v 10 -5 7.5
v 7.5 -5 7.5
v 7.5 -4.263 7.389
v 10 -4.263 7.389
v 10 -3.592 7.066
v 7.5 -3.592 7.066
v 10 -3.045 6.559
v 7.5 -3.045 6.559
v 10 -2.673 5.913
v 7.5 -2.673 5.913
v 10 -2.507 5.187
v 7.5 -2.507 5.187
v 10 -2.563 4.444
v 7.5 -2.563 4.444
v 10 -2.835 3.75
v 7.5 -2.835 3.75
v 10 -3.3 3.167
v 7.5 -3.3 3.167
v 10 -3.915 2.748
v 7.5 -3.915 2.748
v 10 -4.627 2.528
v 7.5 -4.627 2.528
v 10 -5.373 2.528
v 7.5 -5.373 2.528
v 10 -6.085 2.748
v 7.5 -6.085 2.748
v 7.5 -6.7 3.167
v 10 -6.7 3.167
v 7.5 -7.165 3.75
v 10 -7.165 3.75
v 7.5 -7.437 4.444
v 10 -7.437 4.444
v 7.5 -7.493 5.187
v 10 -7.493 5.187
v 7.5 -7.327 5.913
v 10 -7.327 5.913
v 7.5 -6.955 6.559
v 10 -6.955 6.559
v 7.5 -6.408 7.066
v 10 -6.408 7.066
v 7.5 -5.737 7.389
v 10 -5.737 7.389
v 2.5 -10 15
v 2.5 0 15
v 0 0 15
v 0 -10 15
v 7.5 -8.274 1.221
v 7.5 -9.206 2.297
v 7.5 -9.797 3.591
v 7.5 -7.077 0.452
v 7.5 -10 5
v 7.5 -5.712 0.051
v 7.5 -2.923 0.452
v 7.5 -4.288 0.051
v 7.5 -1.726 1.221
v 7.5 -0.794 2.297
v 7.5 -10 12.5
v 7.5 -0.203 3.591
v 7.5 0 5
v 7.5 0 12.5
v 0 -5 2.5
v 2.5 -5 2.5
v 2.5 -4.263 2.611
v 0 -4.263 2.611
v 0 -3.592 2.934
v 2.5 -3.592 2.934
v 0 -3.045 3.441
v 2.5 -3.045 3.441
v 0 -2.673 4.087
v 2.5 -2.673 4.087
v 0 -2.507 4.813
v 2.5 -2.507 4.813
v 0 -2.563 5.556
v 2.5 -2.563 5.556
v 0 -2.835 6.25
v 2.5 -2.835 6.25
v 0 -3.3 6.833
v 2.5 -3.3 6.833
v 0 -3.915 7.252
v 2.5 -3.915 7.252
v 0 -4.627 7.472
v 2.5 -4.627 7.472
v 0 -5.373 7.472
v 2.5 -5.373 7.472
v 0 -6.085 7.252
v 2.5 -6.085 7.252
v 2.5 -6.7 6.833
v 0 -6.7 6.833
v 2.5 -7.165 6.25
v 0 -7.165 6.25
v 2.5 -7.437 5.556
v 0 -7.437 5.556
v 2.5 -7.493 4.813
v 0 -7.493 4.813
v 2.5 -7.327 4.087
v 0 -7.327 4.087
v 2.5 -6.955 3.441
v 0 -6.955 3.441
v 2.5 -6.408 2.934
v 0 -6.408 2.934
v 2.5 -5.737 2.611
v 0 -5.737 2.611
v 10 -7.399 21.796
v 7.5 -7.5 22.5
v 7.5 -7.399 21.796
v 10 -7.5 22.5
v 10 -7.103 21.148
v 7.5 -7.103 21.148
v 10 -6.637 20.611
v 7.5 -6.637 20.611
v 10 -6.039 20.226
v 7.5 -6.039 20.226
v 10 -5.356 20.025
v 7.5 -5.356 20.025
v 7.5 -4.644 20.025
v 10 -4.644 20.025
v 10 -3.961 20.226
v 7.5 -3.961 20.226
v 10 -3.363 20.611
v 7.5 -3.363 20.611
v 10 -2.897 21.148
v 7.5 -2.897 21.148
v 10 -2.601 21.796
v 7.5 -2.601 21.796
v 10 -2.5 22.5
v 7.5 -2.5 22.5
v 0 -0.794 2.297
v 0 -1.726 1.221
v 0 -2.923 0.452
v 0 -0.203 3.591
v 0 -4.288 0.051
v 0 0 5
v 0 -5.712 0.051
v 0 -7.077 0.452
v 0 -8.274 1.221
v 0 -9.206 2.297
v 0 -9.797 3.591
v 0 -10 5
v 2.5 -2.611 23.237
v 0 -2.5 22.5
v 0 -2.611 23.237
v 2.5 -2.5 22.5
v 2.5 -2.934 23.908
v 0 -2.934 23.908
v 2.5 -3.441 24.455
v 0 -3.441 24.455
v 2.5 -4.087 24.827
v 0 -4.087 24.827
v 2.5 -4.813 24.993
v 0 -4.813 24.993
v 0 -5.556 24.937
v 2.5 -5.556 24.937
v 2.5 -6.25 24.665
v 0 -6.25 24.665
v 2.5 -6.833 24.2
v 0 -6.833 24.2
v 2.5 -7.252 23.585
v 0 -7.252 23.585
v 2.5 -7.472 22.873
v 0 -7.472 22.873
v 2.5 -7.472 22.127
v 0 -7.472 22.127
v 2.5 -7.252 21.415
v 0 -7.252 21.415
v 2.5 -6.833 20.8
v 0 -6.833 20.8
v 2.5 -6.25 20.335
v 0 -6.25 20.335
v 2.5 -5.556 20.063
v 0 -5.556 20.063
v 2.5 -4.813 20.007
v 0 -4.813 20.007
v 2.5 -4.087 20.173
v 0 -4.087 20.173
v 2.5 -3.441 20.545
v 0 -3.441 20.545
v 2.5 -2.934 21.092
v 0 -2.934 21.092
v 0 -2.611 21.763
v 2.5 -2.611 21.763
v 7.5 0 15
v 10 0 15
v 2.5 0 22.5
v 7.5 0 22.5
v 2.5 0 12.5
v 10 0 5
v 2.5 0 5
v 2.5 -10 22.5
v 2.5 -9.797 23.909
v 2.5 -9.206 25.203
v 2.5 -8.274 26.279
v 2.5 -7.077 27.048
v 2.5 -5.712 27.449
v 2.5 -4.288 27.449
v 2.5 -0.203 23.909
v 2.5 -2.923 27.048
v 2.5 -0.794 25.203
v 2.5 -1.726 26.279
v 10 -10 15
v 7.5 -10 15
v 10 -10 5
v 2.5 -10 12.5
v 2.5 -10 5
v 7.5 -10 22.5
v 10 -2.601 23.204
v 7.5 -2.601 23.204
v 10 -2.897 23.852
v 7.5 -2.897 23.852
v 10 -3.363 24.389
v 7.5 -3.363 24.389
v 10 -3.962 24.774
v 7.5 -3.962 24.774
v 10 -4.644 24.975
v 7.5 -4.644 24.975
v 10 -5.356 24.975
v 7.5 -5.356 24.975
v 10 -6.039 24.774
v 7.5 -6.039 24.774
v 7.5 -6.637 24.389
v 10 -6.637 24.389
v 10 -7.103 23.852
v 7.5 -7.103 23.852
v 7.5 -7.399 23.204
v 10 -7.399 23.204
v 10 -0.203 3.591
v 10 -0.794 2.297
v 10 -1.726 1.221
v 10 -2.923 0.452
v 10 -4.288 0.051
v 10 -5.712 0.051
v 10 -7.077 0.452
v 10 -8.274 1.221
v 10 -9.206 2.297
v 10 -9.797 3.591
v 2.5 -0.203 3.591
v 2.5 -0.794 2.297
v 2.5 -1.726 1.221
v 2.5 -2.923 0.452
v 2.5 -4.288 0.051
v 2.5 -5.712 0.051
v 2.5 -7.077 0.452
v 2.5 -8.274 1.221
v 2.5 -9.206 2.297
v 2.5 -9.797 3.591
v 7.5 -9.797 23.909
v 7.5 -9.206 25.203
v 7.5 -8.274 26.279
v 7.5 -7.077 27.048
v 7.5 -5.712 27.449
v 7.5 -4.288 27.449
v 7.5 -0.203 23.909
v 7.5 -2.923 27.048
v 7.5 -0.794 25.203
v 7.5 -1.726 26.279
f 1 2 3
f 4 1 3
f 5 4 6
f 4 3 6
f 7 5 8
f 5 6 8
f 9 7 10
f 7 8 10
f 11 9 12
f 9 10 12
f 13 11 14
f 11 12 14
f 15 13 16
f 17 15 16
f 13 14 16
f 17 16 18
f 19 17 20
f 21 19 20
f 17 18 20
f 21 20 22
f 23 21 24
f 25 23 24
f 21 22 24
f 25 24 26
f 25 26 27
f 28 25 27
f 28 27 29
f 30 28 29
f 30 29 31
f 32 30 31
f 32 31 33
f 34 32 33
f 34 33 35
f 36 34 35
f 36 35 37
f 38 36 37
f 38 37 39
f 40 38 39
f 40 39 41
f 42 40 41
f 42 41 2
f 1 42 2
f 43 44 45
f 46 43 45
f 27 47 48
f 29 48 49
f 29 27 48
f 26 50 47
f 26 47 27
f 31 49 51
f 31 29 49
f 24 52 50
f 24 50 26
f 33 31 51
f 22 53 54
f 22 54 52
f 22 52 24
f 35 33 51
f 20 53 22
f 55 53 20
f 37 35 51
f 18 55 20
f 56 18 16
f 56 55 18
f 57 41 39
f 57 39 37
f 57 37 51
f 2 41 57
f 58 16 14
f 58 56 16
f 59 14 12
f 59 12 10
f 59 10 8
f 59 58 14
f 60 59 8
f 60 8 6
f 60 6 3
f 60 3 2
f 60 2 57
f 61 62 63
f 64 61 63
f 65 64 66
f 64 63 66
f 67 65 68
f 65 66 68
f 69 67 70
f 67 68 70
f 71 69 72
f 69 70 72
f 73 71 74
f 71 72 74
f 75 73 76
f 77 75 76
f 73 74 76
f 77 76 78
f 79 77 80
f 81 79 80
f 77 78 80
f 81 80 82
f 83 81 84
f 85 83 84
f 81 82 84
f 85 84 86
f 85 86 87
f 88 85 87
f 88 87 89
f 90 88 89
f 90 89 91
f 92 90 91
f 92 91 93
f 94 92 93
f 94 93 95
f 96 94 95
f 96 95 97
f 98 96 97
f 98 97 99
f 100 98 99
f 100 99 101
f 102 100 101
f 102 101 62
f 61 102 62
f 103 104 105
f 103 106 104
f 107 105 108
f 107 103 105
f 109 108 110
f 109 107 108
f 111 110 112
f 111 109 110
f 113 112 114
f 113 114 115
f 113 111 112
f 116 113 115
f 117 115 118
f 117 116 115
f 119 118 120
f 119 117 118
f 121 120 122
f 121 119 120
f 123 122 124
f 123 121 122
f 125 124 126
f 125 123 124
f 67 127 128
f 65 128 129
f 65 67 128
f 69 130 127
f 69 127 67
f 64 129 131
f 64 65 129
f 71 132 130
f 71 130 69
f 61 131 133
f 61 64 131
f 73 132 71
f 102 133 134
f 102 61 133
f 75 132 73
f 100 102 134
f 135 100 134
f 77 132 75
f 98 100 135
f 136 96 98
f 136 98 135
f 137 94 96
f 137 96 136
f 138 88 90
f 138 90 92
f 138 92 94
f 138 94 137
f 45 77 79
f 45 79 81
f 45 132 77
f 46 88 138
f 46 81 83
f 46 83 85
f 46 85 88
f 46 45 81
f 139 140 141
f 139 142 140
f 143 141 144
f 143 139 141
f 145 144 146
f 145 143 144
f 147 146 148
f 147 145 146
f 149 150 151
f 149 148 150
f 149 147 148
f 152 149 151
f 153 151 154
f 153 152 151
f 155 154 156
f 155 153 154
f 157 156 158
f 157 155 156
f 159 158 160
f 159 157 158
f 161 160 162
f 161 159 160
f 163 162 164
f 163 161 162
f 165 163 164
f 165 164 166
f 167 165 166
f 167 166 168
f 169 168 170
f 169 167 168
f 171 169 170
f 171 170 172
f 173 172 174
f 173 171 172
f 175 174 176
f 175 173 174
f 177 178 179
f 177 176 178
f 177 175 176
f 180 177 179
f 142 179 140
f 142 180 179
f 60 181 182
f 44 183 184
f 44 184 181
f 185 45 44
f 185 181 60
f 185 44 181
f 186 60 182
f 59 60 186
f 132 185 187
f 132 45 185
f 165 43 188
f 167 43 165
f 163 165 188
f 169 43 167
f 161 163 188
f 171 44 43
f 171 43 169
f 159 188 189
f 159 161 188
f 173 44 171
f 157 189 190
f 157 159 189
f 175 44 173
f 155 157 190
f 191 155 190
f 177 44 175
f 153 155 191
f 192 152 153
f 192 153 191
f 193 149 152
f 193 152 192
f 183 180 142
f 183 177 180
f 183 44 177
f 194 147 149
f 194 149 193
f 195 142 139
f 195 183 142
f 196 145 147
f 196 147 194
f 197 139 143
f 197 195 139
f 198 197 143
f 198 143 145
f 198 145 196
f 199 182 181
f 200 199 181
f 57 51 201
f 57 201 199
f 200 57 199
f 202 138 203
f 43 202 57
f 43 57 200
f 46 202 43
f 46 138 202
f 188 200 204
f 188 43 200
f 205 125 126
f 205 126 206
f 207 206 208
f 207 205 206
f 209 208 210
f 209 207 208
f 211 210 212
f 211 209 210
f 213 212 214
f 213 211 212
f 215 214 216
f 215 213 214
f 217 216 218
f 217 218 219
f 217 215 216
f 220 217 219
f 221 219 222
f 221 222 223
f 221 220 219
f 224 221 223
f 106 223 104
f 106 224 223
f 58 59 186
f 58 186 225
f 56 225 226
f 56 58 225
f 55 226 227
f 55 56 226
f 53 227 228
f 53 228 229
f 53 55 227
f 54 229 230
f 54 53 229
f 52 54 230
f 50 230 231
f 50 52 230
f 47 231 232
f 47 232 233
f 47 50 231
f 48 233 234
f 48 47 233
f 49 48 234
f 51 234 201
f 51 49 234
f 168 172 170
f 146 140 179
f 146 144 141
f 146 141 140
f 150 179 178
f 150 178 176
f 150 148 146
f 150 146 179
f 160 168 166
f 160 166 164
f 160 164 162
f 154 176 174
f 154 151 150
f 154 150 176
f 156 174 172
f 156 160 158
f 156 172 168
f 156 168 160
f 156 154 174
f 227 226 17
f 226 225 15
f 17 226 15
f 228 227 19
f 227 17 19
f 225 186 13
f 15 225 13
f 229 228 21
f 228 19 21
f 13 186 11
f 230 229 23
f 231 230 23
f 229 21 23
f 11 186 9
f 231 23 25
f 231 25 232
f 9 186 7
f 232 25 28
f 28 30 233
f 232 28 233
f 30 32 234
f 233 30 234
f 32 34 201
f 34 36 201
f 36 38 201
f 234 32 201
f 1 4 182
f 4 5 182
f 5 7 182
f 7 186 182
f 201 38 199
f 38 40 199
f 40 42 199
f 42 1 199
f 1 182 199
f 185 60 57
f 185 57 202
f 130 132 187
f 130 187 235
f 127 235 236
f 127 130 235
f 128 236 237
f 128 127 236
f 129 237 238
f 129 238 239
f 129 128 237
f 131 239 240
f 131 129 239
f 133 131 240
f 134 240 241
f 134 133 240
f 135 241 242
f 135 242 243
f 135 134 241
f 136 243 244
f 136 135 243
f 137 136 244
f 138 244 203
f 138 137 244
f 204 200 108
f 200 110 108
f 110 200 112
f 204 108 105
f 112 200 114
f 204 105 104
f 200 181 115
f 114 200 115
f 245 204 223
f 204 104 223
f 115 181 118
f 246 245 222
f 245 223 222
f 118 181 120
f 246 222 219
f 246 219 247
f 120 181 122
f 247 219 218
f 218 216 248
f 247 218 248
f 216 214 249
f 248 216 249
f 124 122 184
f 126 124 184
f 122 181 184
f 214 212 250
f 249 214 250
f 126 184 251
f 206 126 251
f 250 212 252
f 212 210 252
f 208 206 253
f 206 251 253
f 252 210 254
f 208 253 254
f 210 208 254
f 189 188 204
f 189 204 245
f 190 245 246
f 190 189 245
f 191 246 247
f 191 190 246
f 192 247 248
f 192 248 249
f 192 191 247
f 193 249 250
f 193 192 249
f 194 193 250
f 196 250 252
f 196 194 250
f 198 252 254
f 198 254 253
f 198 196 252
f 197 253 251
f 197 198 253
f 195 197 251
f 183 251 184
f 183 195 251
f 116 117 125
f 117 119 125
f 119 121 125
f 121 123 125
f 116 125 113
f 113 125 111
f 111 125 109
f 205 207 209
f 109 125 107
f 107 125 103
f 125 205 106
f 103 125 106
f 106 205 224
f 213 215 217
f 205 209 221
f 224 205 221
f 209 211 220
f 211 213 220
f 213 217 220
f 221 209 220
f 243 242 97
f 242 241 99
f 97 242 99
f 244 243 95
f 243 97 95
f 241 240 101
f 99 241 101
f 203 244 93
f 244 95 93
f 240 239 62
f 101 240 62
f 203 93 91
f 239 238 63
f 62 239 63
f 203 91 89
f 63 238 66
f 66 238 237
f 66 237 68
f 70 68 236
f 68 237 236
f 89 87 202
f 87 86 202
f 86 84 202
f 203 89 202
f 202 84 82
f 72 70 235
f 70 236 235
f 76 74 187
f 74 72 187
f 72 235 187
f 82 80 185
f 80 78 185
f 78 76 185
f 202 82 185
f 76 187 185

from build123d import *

# Parameters (mm, degrees)
BOSS_EXTRUDE1_DEPTH          = 10
SKETCH2_W                    = 2.5
SKETCH2_H                    = 7.5
CUT_EXTRUDE1_DEPTH           = 31.923292192
SKETCH3_W                    = 5
SKETCH3_H                    = 7.5
CUT_EXTRUDE2_DEPTH           = 31.923292192
SKETCH4_W                    = 2.5
SKETCH4_H                    = 7.5
CUT_EXTRUDE3_DEPTH           = 31.923292192
SKETCH5_W                    = 2.5
SKETCH5_H                    = 2.5
SKETCH6_W                    = 2.5
SKETCH6_H                    = 2.5
F_5_0_5_DIAMETER_HOLE1_D     = 5
F_5_0_5_DIAMETER_HOLE1_DEPTH = 2.5
F_5_0_5_DIAMETER_HOLE2_D     = 5
F_5_0_5_DIAMETER_HOLE2_DEPTH = 2.5
SKETCH11_W                   = 5
SKETCH11_H                   = 5.816268322
CUT_EXTRUDE4_DEPTH           = 10
CUT_EXTRUDE5_DEPTH           = 2.5
CUT_EXTRUDE6_DEPTH           = 2.5


with BuildPart() as part:
    # Sketch1 → Boss-Extrude1 (new body)
    with BuildSketch(Plane(origin=(0, 0, 0), x_dir=(0, -1, 0), z_dir=(-1, 0, 0))):
        with BuildLine():
            Line((0, 22.5), (0, 5))
            ThreePointArc((0, 5), (5, 0), (10, 5))
            Line((10, 5), (10, 22.5))
            ThreePointArc((10, 22.5), (5, 27.5), (0, 22.5))
        make_face()
    extrude(amount=-BOSS_EXTRUDE1_DEPTH)

    # Sketch2 → Cut-Extrude1 (cut, through all)
    with BuildSketch(Plane(origin=(0, 0, 0), x_dir=(-1, 0, 0), z_dir=(0, 1, 0))):
        with Locations((-1.25, 18.75)):
            Rectangle(SKETCH2_W, SKETCH2_H)
    extrude(amount=-CUT_EXTRUDE1_DEPTH, mode=Mode.SUBTRACT)

    # Sketch3 → Cut-Extrude2 (cut, through all)
    with BuildSketch(Plane(origin=(0, 0, 0), x_dir=(-1, 0, 0), z_dir=(0, 1, 0))):
        with Locations((-5, 8.75)):
            Rectangle(SKETCH3_W, SKETCH3_H)
    extrude(amount=-CUT_EXTRUDE2_DEPTH, mode=Mode.SUBTRACT)

    # Sketch4 → Cut-Extrude3 (cut, through all)
    with BuildSketch(Plane(origin=(0, 0, 0), x_dir=(-1, 0, 0), z_dir=(0, 1, 0))):
        with Locations((-8.75, 18.75)):
            Rectangle(SKETCH4_W, SKETCH4_H)
    extrude(amount=-CUT_EXTRUDE3_DEPTH, mode=Mode.SUBTRACT)

    # Sketch5 → Revolve1 (revolve)
    with BuildSketch(Plane.XY.offset(22.5)):
        with Locations((8.75, -3.75)):
            Rectangle(SKETCH5_W, SKETCH5_H)
    revolve(axis=Axis((7.5, -5, 22.5), (1, 0, 0)))

    # Sketch6 → Revolve2 (revolve)
    with BuildSketch(Plane.XY.offset(22.5)):
        with Locations((1.25, -3.75)):
            Rectangle(SKETCH6_W, SKETCH6_H)
    revolve(axis=Axis((0, -5, 22.5), (1, 0, 0)))

    # Ø5.0 (5) Diameter Hole1
    with Locations(Plane.ZY):
        with Locations((5, -5)):
            Hole(F_5_0_5_DIAMETER_HOLE1_D / 2, depth=F_5_0_5_DIAMETER_HOLE1_DEPTH)

    # Ø5.0 (5) Diameter Hole2
    with Locations(Plane(origin=(10, 0, 0), x_dir=(0, 0, -1), z_dir=(1, 0, 0))):
        with Locations((-5, -5)):
            Hole(F_5_0_5_DIAMETER_HOLE2_D / 2, depth=F_5_0_5_DIAMETER_HOLE2_DEPTH)

    # Sketch11 → Cut-Extrude4 (cut)
    with BuildSketch(Plane.XZ.offset(10)):
        with Locations((5, 2.091865839)):
            Rectangle(SKETCH11_W, SKETCH11_H)
    extrude(amount=-CUT_EXTRUDE4_DEPTH, mode=Mode.SUBTRACT)

    # Sketch12 → Cut-Extrude5 (cut)
    with BuildSketch(Plane(origin=(10, 0, 0), x_dir=(0, 0, -1), z_dir=(1, 0, 0))):
        with BuildLine():
            Line((-22.5, -7.5), (-22.5, -10.000084715))
            ThreePointArc((-22.5, -10.000084715), (-27.500042357, -5.000042357), (-22.5, 0))
            Line((-22.5, 0), (-22.5, -2.500084715))
            ThreePointArc((-22.5, -2.500084715), (-24.999957643, -5.000042357), (-22.5, -7.5))
        make_face()
    extrude(amount=-CUT_EXTRUDE5_DEPTH, mode=Mode.SUBTRACT)

    # Sketch13 → Cut-Extrude6 (cut)
    with BuildSketch(Plane.ZY):
        with BuildLine():
            Line((22.5, 0), (22.5, -2.5))
            ThreePointArc((22.5, -2.5), (25, -5), (22.5, -7.5))
            Line((22.5, -7.5), (22.5, -10))
            ThreePointArc((22.5, -10), (27.5, -5), (22.5, 0))
        make_face()
    extrude(amount=-CUT_EXTRUDE6_DEPTH, mode=Mode.SUBTRACT)


solid = part.part
